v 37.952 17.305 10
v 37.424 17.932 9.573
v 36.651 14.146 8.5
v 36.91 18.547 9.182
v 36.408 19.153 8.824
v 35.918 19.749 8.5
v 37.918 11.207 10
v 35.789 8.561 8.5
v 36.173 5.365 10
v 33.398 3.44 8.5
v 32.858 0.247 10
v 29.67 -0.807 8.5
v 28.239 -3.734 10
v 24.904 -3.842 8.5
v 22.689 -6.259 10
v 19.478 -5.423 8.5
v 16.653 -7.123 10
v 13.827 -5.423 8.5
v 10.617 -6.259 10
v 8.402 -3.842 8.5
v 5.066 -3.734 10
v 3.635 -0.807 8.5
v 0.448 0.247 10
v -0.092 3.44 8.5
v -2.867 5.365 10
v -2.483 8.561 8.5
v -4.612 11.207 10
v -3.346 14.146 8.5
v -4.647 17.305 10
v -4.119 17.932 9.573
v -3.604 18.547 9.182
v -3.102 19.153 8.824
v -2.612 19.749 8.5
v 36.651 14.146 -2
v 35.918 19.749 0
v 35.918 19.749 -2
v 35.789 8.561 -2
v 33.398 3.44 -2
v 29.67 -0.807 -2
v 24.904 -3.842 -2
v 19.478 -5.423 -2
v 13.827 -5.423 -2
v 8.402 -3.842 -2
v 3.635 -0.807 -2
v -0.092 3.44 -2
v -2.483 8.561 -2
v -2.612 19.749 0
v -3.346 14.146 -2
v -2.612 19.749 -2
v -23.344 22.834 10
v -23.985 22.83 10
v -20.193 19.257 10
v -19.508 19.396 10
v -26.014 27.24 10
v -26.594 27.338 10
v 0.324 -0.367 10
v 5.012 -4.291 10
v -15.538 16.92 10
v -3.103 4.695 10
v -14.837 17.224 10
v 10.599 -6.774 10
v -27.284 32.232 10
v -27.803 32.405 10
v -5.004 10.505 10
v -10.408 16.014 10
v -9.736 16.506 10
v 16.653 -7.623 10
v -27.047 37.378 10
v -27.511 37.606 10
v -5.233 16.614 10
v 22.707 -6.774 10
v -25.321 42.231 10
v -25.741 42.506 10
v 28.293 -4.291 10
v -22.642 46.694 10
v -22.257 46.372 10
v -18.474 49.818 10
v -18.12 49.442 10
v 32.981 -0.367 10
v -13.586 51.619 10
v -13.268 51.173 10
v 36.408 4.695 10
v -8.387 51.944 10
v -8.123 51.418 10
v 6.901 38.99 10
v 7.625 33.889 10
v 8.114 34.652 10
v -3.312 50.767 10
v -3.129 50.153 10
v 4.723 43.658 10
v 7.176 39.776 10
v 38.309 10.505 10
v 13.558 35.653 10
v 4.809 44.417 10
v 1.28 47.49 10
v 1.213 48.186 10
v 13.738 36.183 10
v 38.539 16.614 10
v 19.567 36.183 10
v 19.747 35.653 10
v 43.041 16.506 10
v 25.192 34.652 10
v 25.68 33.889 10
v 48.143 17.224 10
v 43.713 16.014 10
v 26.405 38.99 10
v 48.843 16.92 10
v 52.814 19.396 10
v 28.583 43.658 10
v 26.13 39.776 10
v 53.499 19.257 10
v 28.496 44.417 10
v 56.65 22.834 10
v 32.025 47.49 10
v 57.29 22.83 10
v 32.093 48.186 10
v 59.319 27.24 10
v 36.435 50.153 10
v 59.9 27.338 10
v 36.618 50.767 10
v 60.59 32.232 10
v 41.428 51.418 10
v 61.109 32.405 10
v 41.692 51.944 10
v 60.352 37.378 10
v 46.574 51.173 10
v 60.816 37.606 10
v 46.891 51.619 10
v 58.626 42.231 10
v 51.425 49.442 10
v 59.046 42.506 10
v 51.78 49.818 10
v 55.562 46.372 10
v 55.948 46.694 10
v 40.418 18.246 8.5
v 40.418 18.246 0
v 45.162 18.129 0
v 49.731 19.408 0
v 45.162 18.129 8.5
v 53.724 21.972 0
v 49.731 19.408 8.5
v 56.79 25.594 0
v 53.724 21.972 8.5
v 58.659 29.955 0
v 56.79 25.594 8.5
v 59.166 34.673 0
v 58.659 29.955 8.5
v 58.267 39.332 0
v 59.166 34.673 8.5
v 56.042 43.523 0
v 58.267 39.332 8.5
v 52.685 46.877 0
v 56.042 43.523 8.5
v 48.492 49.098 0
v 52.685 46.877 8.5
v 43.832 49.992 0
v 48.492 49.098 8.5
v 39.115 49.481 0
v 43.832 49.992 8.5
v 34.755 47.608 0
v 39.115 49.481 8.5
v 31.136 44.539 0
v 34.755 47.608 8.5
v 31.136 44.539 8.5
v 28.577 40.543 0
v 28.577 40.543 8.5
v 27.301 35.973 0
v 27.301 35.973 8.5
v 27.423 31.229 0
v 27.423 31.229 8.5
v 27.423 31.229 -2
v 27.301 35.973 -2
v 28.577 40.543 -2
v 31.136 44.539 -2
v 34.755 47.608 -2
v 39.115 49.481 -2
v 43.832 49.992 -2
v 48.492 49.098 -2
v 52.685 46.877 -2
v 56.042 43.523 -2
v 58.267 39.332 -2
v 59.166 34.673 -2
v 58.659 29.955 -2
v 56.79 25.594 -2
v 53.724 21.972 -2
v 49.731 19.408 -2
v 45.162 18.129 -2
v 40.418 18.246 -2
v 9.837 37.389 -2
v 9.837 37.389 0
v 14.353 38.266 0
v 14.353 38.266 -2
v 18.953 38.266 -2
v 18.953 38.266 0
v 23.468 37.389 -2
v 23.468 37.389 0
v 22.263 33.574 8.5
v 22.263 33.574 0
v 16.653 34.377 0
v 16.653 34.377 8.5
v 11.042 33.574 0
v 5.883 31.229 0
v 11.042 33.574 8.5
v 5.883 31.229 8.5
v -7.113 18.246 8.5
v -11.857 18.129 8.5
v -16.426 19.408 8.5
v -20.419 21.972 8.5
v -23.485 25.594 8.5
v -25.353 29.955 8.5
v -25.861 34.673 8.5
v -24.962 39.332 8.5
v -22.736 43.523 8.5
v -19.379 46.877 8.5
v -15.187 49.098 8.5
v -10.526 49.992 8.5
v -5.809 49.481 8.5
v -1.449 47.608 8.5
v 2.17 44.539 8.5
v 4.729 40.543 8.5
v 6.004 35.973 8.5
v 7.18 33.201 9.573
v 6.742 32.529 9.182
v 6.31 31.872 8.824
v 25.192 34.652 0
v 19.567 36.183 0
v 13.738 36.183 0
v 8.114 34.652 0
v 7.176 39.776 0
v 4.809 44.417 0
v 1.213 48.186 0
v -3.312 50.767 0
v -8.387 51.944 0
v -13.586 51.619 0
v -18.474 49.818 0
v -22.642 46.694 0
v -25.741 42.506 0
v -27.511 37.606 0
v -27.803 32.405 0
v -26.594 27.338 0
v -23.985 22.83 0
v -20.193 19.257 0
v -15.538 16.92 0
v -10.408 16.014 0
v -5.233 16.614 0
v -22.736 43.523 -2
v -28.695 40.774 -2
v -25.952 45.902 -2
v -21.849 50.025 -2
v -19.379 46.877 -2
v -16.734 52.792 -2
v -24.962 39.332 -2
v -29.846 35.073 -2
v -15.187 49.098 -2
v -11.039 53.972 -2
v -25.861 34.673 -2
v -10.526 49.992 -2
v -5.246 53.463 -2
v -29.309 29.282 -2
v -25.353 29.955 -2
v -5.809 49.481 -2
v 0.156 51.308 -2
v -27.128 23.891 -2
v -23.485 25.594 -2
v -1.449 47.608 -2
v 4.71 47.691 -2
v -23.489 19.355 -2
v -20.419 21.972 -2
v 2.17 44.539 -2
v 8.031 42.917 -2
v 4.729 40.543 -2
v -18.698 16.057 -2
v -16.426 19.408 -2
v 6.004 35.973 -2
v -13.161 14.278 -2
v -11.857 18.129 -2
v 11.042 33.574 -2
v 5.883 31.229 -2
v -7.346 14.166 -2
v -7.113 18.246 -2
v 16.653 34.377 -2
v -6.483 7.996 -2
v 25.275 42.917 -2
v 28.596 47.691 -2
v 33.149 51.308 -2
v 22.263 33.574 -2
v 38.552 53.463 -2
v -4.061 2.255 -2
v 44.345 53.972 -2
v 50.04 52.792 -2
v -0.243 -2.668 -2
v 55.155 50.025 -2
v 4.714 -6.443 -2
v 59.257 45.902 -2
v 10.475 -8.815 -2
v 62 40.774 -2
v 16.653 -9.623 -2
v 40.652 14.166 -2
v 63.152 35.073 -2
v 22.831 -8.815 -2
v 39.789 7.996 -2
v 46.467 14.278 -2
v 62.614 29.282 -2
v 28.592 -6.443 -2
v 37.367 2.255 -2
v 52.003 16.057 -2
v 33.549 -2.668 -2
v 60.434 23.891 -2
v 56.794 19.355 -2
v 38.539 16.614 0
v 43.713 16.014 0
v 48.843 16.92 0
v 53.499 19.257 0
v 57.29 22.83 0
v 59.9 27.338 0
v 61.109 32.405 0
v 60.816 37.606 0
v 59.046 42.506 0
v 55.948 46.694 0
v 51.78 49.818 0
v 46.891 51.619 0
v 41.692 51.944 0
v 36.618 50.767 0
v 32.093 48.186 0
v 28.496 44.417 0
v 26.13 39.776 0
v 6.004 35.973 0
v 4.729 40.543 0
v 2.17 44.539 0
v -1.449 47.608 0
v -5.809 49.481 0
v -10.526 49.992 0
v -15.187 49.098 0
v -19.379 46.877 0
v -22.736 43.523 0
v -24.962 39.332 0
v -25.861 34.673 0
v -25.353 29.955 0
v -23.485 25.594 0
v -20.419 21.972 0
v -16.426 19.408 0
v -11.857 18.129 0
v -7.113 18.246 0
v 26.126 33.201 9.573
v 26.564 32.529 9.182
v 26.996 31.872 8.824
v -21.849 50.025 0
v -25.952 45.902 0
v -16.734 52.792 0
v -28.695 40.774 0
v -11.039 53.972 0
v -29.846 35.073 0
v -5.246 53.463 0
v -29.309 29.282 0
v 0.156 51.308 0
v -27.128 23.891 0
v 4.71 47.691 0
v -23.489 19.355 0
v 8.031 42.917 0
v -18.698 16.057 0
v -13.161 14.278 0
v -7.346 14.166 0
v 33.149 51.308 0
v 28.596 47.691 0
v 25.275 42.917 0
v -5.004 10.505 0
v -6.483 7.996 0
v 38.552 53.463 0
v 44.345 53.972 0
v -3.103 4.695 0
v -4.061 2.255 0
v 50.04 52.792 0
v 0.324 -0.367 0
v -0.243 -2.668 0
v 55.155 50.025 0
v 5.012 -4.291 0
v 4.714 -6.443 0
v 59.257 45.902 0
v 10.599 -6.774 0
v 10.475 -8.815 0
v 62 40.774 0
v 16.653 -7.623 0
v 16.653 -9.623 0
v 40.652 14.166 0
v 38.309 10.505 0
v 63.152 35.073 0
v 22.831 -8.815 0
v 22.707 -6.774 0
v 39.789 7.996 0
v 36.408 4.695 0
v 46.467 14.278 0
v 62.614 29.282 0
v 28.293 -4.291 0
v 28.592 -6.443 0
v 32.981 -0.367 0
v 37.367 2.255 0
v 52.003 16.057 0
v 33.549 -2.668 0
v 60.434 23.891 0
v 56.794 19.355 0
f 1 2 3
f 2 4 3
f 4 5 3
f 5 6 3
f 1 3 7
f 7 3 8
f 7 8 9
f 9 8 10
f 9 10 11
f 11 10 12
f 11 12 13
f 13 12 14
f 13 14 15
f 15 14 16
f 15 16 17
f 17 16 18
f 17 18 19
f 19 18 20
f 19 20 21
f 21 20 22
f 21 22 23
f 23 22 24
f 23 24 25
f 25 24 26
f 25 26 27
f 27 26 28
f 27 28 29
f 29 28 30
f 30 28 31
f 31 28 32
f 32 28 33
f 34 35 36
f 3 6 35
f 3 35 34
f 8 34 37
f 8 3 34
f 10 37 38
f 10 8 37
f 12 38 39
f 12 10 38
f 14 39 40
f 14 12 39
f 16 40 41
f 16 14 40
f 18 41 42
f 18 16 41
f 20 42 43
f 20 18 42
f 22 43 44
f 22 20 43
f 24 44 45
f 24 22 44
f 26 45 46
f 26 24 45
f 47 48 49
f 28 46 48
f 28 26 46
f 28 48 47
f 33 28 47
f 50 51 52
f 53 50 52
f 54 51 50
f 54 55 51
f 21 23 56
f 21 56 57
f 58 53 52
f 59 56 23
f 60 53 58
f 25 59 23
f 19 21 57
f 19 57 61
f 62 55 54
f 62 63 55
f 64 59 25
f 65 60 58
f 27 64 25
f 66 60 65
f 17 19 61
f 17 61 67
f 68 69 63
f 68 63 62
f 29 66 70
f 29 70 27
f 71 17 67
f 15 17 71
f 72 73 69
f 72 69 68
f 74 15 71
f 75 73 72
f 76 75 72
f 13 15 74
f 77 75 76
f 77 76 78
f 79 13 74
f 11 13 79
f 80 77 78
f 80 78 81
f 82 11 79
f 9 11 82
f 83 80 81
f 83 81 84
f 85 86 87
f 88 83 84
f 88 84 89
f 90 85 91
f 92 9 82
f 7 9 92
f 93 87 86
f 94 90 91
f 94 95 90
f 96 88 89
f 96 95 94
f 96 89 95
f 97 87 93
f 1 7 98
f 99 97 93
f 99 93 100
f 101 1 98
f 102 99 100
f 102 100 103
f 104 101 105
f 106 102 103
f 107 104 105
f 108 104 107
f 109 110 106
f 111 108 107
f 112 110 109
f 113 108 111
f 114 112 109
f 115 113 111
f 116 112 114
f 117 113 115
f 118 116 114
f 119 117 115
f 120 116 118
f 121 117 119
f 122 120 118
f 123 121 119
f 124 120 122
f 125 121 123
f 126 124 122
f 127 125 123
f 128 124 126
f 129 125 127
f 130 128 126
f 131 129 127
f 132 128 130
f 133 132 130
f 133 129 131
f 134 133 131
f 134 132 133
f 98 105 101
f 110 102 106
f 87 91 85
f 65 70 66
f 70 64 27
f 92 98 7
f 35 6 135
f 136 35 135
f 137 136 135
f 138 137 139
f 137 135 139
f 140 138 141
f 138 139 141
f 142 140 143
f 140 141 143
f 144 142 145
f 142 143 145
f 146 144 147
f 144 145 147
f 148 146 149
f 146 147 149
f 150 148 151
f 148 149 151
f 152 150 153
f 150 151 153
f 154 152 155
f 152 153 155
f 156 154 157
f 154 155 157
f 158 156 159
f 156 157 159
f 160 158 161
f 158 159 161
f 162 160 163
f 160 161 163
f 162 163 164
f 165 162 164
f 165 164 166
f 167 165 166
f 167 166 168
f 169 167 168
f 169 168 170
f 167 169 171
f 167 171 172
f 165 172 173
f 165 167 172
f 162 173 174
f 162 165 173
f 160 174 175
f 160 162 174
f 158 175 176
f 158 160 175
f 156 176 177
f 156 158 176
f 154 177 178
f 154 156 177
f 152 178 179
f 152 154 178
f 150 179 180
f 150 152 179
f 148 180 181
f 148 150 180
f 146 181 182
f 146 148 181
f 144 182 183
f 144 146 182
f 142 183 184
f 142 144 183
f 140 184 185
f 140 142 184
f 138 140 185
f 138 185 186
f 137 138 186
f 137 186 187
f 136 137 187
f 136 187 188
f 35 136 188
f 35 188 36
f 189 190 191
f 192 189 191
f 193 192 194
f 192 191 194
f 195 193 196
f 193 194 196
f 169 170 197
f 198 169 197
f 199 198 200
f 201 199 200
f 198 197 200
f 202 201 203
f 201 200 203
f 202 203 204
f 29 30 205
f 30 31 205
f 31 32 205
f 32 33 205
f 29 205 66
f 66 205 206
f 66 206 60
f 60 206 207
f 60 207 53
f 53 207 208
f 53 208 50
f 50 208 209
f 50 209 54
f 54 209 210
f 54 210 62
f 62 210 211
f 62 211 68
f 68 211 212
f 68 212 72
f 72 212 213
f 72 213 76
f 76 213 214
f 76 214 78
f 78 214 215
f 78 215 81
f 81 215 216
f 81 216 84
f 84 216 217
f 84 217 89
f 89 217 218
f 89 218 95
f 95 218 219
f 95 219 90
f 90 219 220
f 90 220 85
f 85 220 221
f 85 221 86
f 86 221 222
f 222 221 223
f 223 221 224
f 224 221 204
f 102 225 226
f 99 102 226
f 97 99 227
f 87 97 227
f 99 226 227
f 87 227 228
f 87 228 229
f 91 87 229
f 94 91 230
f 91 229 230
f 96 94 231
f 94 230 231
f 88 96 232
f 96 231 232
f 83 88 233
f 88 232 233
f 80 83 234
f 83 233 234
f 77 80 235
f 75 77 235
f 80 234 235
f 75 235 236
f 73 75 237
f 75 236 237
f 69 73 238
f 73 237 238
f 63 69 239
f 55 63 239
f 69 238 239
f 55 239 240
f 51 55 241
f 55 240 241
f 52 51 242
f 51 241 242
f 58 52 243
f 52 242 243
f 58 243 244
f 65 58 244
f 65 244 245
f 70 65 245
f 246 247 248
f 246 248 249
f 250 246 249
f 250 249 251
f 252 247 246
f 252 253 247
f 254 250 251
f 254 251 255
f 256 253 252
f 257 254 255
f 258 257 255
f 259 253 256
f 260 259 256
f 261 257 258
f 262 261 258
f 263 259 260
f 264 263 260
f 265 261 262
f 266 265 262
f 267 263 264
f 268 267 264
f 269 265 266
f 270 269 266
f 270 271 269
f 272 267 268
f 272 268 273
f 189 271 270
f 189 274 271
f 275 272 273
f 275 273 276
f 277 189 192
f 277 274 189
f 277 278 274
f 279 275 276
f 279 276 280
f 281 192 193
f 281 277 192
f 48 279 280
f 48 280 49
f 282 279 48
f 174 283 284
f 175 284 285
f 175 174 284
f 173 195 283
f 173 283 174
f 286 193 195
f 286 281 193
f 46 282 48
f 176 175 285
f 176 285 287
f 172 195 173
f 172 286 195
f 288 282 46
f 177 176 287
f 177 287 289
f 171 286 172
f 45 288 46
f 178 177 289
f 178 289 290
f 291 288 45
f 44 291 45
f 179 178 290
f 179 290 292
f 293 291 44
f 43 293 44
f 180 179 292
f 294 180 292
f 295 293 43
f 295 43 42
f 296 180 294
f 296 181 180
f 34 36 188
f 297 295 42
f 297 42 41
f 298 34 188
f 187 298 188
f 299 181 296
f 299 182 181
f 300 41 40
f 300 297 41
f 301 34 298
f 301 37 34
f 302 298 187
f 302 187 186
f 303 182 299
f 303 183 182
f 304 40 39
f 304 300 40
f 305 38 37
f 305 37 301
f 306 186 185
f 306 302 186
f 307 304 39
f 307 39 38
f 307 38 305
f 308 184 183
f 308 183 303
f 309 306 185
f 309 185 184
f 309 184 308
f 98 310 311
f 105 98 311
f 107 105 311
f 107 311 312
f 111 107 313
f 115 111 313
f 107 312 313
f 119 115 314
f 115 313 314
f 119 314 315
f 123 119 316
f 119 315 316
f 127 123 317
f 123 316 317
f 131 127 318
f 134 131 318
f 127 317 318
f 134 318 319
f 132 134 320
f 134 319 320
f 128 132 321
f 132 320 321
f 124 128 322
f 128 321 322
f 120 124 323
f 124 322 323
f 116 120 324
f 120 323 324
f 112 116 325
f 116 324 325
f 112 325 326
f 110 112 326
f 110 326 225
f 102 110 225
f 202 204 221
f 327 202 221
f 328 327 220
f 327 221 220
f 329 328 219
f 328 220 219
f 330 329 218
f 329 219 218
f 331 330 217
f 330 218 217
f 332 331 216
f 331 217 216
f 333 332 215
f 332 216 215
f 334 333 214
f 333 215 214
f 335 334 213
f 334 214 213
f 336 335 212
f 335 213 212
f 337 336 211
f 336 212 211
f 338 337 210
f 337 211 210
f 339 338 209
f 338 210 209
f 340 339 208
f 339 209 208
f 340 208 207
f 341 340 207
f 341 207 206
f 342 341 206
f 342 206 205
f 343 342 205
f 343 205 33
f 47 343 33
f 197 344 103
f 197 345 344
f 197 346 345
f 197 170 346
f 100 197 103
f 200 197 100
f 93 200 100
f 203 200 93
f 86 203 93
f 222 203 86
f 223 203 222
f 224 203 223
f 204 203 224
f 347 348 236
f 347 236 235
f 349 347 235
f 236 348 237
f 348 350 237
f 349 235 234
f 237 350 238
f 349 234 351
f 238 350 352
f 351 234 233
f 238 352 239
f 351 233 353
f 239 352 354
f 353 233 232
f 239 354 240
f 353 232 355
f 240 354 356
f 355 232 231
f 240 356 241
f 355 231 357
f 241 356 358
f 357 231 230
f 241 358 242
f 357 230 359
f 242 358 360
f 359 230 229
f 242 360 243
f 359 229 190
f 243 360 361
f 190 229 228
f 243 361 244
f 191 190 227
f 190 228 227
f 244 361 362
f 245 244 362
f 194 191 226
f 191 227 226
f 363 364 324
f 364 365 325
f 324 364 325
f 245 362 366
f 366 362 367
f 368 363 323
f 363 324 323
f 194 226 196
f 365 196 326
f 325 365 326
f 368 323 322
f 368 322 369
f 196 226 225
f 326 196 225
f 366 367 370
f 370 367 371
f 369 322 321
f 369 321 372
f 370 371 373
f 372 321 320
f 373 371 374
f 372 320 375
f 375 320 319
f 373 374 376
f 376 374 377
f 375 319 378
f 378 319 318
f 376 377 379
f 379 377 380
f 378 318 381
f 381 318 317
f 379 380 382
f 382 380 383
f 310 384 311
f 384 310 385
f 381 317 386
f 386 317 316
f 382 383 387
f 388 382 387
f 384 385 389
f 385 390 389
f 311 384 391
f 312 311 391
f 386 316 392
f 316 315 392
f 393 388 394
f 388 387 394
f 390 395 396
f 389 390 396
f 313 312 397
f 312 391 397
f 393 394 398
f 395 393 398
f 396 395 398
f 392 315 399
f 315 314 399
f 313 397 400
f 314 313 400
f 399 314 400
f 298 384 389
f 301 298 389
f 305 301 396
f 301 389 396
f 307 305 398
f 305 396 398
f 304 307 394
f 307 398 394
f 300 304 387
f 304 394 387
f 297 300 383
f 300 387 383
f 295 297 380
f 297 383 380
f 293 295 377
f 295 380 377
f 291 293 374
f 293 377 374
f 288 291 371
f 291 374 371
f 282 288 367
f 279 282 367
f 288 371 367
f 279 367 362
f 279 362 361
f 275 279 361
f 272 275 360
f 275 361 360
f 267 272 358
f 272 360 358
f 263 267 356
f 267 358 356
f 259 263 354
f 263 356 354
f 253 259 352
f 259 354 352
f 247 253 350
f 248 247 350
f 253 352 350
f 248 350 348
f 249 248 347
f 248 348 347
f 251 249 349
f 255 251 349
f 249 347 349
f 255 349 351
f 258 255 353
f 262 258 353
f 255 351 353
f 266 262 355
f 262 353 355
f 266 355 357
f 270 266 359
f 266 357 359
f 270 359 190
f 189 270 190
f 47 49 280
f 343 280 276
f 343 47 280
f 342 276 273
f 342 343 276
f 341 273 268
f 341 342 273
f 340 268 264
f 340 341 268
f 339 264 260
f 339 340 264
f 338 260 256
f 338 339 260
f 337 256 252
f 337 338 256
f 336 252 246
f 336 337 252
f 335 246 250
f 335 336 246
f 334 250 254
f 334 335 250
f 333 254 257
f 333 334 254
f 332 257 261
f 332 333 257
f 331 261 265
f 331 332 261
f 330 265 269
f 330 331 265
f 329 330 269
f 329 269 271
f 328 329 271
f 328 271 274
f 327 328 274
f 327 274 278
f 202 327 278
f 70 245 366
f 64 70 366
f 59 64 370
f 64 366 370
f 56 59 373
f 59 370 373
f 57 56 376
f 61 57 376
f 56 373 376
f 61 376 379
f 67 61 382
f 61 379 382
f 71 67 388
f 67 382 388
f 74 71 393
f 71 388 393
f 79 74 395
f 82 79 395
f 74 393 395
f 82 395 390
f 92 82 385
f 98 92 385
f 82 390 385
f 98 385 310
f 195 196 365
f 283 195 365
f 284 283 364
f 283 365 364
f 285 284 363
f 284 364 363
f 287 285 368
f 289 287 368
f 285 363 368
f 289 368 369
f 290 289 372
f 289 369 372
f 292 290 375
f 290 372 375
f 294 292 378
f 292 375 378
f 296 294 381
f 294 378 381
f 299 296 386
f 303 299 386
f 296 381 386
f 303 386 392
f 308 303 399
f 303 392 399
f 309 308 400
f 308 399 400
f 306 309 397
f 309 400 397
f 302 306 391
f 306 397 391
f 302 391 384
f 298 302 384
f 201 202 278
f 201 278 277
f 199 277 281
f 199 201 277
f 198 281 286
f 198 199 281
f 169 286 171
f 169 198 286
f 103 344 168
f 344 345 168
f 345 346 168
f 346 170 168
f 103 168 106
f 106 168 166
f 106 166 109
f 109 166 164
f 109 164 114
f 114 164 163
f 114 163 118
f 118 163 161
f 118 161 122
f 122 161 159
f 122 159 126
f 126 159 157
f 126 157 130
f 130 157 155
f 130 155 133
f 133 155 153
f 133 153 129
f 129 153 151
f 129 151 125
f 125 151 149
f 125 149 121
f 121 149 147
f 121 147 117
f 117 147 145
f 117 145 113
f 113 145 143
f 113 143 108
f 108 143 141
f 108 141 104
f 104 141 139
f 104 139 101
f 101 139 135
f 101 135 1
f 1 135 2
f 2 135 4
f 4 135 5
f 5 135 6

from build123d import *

# Parameters (mm, degrees)
PAD_DEPTH       = 10
SKETCH001_R     = 20
POCKET_DEPTH    = 10
SKETCH002_R     = 16
POCKET001_DEPTH = 10
CHAMFER_SIZE    = 1.5
CHAMFER001_SIZE = 1.5
CHAMFER002_SIZE = 1.5
CHAMFER003_SIZE = 1.5
PAD001_DEPTH    = 2


with BuildPart() as part:
    # Sketch → Pad (new body)
    with BuildSketch(Plane.XY):
        with BuildLine():
            ThreePointArc((38.5386550517, 16.614400785), (57.6494681052, 44.7125163297), (25.1916455851, 34.6518488576))
            ThreePointArc((25.1916455851, 34.6518488576), (16.6527682137, 36.3765542054), (8.1138908423, 34.6518488576))
            ThreePointArc((8.1138908423, 34.6518488576), (-24.3439316777, 44.7125163297), (-5.2331186243, 16.614400785))
            ThreePointArc((-5.2331186243, 16.614400785), (16.6527682137, -7.6234457946), (38.5386550517, 16.614400785))
        make_face()
    extrude(amount=PAD_DEPTH)

    # Sketch001 (on Face6 of Pad) → Pocket (cut)
    with BuildSketch(Plane.XY.offset(10)):
        with Locations((16.6527682137, 14.3765542054)):
            Circle(SKETCH001_R)
    extrude(amount=-POCKET_DEPTH, mode=Mode.SUBTRACT)

    # Sketch002 (on Face5 of Pocket) → Pocket001 (cut)
    with BuildSketch(Plane.XY.offset(10)):
        with Locations((-9.8745081866, 34.0057061682)):
            Circle(SKETCH002_R)
        with Locations((43.1800446141, 34.0057061682)):
            Circle(SKETCH002_R)
    extrude(amount=-POCKET001_DEPTH, mode=Mode.SUBTRACT)

    # Chamfer
    chamfer_edges = [part.edges().sort_by_distance(p)[0] for p in [
        (41.78641, 49.944896, 10),
    ]]
    chamfer(chamfer_edges, length=CHAMFER_SIZE)

    # Chamfer001
    chamfer001_edges = [part.edges().sort_by_distance(p)[0] for p in [
        (36.574516, 16.144027, 10),
    ]]
    chamfer(chamfer001_edges, length=CHAMFER001_SIZE)

    # Chamfer002
    chamfer002_edges = [part.edges().sort_by_distance(p)[0] for p in [
        (15.703375, 34.354008, 10),
    ]]
    chamfer(chamfer002_edges, length=CHAMFER002_SIZE)

    # Chamfer003
    chamfer003_edges = [part.edges().sort_by_distance(p)[0] for p in [
        (-22.998023, 43.158485, 10),
    ]]
    chamfer(chamfer003_edges, length=CHAMFER003_SIZE)

    # Sketch004 (on Face20 of Chamfer003) → Pad001 (join)
    with BuildSketch(Plane(origin=(0, 0, 0), x_dir=(1, 0, 0), z_dir=(0, 0, -1))):
        with BuildLine():
            ThreePointArc((40.6518458567, -14.1661444028), (16.6527682137, 9.6234457946), (-7.3463094293, -14.1661444028))
            ThreePointArc((-7.3463094293, -14.1661444028), (-25.951645399, -45.9021619032), (9.8373328664, -37.3885041668))
            ThreePointArc((9.8373328664, -37.3885041668), (16.6527682137, -38.3765542054), (23.4682035611, -37.3885041668))
            ThreePointArc((23.4682035611, -37.3885041668), (59.2571818264, -45.9021619032), (40.6518458567, -14.1661444028))
        make_face()
        with BuildLine():
            ThreePointArc((35.917730039, -19.7488205682), (16.6527682137, 5.6234457946), (-2.6121936115, -19.7488205682))
            ThreePointArc((-2.6121936115, -19.7488205682), (-22.7362179565, -43.5228707562), (5.8827146104, -31.2290301476))
            ThreePointArc((5.8827146104, -31.2290301476), (16.6527682137, -34.3765542054), (27.422821817, -31.2290301476))
            ThreePointArc((27.422821817, -31.2290301476), (56.041754384, -43.5228707562), (35.917730039, -19.7488205682))
        make_face(mode=Mode.SUBTRACT)
    extrude(amount=PAD001_DEPTH)


solid = part.part
